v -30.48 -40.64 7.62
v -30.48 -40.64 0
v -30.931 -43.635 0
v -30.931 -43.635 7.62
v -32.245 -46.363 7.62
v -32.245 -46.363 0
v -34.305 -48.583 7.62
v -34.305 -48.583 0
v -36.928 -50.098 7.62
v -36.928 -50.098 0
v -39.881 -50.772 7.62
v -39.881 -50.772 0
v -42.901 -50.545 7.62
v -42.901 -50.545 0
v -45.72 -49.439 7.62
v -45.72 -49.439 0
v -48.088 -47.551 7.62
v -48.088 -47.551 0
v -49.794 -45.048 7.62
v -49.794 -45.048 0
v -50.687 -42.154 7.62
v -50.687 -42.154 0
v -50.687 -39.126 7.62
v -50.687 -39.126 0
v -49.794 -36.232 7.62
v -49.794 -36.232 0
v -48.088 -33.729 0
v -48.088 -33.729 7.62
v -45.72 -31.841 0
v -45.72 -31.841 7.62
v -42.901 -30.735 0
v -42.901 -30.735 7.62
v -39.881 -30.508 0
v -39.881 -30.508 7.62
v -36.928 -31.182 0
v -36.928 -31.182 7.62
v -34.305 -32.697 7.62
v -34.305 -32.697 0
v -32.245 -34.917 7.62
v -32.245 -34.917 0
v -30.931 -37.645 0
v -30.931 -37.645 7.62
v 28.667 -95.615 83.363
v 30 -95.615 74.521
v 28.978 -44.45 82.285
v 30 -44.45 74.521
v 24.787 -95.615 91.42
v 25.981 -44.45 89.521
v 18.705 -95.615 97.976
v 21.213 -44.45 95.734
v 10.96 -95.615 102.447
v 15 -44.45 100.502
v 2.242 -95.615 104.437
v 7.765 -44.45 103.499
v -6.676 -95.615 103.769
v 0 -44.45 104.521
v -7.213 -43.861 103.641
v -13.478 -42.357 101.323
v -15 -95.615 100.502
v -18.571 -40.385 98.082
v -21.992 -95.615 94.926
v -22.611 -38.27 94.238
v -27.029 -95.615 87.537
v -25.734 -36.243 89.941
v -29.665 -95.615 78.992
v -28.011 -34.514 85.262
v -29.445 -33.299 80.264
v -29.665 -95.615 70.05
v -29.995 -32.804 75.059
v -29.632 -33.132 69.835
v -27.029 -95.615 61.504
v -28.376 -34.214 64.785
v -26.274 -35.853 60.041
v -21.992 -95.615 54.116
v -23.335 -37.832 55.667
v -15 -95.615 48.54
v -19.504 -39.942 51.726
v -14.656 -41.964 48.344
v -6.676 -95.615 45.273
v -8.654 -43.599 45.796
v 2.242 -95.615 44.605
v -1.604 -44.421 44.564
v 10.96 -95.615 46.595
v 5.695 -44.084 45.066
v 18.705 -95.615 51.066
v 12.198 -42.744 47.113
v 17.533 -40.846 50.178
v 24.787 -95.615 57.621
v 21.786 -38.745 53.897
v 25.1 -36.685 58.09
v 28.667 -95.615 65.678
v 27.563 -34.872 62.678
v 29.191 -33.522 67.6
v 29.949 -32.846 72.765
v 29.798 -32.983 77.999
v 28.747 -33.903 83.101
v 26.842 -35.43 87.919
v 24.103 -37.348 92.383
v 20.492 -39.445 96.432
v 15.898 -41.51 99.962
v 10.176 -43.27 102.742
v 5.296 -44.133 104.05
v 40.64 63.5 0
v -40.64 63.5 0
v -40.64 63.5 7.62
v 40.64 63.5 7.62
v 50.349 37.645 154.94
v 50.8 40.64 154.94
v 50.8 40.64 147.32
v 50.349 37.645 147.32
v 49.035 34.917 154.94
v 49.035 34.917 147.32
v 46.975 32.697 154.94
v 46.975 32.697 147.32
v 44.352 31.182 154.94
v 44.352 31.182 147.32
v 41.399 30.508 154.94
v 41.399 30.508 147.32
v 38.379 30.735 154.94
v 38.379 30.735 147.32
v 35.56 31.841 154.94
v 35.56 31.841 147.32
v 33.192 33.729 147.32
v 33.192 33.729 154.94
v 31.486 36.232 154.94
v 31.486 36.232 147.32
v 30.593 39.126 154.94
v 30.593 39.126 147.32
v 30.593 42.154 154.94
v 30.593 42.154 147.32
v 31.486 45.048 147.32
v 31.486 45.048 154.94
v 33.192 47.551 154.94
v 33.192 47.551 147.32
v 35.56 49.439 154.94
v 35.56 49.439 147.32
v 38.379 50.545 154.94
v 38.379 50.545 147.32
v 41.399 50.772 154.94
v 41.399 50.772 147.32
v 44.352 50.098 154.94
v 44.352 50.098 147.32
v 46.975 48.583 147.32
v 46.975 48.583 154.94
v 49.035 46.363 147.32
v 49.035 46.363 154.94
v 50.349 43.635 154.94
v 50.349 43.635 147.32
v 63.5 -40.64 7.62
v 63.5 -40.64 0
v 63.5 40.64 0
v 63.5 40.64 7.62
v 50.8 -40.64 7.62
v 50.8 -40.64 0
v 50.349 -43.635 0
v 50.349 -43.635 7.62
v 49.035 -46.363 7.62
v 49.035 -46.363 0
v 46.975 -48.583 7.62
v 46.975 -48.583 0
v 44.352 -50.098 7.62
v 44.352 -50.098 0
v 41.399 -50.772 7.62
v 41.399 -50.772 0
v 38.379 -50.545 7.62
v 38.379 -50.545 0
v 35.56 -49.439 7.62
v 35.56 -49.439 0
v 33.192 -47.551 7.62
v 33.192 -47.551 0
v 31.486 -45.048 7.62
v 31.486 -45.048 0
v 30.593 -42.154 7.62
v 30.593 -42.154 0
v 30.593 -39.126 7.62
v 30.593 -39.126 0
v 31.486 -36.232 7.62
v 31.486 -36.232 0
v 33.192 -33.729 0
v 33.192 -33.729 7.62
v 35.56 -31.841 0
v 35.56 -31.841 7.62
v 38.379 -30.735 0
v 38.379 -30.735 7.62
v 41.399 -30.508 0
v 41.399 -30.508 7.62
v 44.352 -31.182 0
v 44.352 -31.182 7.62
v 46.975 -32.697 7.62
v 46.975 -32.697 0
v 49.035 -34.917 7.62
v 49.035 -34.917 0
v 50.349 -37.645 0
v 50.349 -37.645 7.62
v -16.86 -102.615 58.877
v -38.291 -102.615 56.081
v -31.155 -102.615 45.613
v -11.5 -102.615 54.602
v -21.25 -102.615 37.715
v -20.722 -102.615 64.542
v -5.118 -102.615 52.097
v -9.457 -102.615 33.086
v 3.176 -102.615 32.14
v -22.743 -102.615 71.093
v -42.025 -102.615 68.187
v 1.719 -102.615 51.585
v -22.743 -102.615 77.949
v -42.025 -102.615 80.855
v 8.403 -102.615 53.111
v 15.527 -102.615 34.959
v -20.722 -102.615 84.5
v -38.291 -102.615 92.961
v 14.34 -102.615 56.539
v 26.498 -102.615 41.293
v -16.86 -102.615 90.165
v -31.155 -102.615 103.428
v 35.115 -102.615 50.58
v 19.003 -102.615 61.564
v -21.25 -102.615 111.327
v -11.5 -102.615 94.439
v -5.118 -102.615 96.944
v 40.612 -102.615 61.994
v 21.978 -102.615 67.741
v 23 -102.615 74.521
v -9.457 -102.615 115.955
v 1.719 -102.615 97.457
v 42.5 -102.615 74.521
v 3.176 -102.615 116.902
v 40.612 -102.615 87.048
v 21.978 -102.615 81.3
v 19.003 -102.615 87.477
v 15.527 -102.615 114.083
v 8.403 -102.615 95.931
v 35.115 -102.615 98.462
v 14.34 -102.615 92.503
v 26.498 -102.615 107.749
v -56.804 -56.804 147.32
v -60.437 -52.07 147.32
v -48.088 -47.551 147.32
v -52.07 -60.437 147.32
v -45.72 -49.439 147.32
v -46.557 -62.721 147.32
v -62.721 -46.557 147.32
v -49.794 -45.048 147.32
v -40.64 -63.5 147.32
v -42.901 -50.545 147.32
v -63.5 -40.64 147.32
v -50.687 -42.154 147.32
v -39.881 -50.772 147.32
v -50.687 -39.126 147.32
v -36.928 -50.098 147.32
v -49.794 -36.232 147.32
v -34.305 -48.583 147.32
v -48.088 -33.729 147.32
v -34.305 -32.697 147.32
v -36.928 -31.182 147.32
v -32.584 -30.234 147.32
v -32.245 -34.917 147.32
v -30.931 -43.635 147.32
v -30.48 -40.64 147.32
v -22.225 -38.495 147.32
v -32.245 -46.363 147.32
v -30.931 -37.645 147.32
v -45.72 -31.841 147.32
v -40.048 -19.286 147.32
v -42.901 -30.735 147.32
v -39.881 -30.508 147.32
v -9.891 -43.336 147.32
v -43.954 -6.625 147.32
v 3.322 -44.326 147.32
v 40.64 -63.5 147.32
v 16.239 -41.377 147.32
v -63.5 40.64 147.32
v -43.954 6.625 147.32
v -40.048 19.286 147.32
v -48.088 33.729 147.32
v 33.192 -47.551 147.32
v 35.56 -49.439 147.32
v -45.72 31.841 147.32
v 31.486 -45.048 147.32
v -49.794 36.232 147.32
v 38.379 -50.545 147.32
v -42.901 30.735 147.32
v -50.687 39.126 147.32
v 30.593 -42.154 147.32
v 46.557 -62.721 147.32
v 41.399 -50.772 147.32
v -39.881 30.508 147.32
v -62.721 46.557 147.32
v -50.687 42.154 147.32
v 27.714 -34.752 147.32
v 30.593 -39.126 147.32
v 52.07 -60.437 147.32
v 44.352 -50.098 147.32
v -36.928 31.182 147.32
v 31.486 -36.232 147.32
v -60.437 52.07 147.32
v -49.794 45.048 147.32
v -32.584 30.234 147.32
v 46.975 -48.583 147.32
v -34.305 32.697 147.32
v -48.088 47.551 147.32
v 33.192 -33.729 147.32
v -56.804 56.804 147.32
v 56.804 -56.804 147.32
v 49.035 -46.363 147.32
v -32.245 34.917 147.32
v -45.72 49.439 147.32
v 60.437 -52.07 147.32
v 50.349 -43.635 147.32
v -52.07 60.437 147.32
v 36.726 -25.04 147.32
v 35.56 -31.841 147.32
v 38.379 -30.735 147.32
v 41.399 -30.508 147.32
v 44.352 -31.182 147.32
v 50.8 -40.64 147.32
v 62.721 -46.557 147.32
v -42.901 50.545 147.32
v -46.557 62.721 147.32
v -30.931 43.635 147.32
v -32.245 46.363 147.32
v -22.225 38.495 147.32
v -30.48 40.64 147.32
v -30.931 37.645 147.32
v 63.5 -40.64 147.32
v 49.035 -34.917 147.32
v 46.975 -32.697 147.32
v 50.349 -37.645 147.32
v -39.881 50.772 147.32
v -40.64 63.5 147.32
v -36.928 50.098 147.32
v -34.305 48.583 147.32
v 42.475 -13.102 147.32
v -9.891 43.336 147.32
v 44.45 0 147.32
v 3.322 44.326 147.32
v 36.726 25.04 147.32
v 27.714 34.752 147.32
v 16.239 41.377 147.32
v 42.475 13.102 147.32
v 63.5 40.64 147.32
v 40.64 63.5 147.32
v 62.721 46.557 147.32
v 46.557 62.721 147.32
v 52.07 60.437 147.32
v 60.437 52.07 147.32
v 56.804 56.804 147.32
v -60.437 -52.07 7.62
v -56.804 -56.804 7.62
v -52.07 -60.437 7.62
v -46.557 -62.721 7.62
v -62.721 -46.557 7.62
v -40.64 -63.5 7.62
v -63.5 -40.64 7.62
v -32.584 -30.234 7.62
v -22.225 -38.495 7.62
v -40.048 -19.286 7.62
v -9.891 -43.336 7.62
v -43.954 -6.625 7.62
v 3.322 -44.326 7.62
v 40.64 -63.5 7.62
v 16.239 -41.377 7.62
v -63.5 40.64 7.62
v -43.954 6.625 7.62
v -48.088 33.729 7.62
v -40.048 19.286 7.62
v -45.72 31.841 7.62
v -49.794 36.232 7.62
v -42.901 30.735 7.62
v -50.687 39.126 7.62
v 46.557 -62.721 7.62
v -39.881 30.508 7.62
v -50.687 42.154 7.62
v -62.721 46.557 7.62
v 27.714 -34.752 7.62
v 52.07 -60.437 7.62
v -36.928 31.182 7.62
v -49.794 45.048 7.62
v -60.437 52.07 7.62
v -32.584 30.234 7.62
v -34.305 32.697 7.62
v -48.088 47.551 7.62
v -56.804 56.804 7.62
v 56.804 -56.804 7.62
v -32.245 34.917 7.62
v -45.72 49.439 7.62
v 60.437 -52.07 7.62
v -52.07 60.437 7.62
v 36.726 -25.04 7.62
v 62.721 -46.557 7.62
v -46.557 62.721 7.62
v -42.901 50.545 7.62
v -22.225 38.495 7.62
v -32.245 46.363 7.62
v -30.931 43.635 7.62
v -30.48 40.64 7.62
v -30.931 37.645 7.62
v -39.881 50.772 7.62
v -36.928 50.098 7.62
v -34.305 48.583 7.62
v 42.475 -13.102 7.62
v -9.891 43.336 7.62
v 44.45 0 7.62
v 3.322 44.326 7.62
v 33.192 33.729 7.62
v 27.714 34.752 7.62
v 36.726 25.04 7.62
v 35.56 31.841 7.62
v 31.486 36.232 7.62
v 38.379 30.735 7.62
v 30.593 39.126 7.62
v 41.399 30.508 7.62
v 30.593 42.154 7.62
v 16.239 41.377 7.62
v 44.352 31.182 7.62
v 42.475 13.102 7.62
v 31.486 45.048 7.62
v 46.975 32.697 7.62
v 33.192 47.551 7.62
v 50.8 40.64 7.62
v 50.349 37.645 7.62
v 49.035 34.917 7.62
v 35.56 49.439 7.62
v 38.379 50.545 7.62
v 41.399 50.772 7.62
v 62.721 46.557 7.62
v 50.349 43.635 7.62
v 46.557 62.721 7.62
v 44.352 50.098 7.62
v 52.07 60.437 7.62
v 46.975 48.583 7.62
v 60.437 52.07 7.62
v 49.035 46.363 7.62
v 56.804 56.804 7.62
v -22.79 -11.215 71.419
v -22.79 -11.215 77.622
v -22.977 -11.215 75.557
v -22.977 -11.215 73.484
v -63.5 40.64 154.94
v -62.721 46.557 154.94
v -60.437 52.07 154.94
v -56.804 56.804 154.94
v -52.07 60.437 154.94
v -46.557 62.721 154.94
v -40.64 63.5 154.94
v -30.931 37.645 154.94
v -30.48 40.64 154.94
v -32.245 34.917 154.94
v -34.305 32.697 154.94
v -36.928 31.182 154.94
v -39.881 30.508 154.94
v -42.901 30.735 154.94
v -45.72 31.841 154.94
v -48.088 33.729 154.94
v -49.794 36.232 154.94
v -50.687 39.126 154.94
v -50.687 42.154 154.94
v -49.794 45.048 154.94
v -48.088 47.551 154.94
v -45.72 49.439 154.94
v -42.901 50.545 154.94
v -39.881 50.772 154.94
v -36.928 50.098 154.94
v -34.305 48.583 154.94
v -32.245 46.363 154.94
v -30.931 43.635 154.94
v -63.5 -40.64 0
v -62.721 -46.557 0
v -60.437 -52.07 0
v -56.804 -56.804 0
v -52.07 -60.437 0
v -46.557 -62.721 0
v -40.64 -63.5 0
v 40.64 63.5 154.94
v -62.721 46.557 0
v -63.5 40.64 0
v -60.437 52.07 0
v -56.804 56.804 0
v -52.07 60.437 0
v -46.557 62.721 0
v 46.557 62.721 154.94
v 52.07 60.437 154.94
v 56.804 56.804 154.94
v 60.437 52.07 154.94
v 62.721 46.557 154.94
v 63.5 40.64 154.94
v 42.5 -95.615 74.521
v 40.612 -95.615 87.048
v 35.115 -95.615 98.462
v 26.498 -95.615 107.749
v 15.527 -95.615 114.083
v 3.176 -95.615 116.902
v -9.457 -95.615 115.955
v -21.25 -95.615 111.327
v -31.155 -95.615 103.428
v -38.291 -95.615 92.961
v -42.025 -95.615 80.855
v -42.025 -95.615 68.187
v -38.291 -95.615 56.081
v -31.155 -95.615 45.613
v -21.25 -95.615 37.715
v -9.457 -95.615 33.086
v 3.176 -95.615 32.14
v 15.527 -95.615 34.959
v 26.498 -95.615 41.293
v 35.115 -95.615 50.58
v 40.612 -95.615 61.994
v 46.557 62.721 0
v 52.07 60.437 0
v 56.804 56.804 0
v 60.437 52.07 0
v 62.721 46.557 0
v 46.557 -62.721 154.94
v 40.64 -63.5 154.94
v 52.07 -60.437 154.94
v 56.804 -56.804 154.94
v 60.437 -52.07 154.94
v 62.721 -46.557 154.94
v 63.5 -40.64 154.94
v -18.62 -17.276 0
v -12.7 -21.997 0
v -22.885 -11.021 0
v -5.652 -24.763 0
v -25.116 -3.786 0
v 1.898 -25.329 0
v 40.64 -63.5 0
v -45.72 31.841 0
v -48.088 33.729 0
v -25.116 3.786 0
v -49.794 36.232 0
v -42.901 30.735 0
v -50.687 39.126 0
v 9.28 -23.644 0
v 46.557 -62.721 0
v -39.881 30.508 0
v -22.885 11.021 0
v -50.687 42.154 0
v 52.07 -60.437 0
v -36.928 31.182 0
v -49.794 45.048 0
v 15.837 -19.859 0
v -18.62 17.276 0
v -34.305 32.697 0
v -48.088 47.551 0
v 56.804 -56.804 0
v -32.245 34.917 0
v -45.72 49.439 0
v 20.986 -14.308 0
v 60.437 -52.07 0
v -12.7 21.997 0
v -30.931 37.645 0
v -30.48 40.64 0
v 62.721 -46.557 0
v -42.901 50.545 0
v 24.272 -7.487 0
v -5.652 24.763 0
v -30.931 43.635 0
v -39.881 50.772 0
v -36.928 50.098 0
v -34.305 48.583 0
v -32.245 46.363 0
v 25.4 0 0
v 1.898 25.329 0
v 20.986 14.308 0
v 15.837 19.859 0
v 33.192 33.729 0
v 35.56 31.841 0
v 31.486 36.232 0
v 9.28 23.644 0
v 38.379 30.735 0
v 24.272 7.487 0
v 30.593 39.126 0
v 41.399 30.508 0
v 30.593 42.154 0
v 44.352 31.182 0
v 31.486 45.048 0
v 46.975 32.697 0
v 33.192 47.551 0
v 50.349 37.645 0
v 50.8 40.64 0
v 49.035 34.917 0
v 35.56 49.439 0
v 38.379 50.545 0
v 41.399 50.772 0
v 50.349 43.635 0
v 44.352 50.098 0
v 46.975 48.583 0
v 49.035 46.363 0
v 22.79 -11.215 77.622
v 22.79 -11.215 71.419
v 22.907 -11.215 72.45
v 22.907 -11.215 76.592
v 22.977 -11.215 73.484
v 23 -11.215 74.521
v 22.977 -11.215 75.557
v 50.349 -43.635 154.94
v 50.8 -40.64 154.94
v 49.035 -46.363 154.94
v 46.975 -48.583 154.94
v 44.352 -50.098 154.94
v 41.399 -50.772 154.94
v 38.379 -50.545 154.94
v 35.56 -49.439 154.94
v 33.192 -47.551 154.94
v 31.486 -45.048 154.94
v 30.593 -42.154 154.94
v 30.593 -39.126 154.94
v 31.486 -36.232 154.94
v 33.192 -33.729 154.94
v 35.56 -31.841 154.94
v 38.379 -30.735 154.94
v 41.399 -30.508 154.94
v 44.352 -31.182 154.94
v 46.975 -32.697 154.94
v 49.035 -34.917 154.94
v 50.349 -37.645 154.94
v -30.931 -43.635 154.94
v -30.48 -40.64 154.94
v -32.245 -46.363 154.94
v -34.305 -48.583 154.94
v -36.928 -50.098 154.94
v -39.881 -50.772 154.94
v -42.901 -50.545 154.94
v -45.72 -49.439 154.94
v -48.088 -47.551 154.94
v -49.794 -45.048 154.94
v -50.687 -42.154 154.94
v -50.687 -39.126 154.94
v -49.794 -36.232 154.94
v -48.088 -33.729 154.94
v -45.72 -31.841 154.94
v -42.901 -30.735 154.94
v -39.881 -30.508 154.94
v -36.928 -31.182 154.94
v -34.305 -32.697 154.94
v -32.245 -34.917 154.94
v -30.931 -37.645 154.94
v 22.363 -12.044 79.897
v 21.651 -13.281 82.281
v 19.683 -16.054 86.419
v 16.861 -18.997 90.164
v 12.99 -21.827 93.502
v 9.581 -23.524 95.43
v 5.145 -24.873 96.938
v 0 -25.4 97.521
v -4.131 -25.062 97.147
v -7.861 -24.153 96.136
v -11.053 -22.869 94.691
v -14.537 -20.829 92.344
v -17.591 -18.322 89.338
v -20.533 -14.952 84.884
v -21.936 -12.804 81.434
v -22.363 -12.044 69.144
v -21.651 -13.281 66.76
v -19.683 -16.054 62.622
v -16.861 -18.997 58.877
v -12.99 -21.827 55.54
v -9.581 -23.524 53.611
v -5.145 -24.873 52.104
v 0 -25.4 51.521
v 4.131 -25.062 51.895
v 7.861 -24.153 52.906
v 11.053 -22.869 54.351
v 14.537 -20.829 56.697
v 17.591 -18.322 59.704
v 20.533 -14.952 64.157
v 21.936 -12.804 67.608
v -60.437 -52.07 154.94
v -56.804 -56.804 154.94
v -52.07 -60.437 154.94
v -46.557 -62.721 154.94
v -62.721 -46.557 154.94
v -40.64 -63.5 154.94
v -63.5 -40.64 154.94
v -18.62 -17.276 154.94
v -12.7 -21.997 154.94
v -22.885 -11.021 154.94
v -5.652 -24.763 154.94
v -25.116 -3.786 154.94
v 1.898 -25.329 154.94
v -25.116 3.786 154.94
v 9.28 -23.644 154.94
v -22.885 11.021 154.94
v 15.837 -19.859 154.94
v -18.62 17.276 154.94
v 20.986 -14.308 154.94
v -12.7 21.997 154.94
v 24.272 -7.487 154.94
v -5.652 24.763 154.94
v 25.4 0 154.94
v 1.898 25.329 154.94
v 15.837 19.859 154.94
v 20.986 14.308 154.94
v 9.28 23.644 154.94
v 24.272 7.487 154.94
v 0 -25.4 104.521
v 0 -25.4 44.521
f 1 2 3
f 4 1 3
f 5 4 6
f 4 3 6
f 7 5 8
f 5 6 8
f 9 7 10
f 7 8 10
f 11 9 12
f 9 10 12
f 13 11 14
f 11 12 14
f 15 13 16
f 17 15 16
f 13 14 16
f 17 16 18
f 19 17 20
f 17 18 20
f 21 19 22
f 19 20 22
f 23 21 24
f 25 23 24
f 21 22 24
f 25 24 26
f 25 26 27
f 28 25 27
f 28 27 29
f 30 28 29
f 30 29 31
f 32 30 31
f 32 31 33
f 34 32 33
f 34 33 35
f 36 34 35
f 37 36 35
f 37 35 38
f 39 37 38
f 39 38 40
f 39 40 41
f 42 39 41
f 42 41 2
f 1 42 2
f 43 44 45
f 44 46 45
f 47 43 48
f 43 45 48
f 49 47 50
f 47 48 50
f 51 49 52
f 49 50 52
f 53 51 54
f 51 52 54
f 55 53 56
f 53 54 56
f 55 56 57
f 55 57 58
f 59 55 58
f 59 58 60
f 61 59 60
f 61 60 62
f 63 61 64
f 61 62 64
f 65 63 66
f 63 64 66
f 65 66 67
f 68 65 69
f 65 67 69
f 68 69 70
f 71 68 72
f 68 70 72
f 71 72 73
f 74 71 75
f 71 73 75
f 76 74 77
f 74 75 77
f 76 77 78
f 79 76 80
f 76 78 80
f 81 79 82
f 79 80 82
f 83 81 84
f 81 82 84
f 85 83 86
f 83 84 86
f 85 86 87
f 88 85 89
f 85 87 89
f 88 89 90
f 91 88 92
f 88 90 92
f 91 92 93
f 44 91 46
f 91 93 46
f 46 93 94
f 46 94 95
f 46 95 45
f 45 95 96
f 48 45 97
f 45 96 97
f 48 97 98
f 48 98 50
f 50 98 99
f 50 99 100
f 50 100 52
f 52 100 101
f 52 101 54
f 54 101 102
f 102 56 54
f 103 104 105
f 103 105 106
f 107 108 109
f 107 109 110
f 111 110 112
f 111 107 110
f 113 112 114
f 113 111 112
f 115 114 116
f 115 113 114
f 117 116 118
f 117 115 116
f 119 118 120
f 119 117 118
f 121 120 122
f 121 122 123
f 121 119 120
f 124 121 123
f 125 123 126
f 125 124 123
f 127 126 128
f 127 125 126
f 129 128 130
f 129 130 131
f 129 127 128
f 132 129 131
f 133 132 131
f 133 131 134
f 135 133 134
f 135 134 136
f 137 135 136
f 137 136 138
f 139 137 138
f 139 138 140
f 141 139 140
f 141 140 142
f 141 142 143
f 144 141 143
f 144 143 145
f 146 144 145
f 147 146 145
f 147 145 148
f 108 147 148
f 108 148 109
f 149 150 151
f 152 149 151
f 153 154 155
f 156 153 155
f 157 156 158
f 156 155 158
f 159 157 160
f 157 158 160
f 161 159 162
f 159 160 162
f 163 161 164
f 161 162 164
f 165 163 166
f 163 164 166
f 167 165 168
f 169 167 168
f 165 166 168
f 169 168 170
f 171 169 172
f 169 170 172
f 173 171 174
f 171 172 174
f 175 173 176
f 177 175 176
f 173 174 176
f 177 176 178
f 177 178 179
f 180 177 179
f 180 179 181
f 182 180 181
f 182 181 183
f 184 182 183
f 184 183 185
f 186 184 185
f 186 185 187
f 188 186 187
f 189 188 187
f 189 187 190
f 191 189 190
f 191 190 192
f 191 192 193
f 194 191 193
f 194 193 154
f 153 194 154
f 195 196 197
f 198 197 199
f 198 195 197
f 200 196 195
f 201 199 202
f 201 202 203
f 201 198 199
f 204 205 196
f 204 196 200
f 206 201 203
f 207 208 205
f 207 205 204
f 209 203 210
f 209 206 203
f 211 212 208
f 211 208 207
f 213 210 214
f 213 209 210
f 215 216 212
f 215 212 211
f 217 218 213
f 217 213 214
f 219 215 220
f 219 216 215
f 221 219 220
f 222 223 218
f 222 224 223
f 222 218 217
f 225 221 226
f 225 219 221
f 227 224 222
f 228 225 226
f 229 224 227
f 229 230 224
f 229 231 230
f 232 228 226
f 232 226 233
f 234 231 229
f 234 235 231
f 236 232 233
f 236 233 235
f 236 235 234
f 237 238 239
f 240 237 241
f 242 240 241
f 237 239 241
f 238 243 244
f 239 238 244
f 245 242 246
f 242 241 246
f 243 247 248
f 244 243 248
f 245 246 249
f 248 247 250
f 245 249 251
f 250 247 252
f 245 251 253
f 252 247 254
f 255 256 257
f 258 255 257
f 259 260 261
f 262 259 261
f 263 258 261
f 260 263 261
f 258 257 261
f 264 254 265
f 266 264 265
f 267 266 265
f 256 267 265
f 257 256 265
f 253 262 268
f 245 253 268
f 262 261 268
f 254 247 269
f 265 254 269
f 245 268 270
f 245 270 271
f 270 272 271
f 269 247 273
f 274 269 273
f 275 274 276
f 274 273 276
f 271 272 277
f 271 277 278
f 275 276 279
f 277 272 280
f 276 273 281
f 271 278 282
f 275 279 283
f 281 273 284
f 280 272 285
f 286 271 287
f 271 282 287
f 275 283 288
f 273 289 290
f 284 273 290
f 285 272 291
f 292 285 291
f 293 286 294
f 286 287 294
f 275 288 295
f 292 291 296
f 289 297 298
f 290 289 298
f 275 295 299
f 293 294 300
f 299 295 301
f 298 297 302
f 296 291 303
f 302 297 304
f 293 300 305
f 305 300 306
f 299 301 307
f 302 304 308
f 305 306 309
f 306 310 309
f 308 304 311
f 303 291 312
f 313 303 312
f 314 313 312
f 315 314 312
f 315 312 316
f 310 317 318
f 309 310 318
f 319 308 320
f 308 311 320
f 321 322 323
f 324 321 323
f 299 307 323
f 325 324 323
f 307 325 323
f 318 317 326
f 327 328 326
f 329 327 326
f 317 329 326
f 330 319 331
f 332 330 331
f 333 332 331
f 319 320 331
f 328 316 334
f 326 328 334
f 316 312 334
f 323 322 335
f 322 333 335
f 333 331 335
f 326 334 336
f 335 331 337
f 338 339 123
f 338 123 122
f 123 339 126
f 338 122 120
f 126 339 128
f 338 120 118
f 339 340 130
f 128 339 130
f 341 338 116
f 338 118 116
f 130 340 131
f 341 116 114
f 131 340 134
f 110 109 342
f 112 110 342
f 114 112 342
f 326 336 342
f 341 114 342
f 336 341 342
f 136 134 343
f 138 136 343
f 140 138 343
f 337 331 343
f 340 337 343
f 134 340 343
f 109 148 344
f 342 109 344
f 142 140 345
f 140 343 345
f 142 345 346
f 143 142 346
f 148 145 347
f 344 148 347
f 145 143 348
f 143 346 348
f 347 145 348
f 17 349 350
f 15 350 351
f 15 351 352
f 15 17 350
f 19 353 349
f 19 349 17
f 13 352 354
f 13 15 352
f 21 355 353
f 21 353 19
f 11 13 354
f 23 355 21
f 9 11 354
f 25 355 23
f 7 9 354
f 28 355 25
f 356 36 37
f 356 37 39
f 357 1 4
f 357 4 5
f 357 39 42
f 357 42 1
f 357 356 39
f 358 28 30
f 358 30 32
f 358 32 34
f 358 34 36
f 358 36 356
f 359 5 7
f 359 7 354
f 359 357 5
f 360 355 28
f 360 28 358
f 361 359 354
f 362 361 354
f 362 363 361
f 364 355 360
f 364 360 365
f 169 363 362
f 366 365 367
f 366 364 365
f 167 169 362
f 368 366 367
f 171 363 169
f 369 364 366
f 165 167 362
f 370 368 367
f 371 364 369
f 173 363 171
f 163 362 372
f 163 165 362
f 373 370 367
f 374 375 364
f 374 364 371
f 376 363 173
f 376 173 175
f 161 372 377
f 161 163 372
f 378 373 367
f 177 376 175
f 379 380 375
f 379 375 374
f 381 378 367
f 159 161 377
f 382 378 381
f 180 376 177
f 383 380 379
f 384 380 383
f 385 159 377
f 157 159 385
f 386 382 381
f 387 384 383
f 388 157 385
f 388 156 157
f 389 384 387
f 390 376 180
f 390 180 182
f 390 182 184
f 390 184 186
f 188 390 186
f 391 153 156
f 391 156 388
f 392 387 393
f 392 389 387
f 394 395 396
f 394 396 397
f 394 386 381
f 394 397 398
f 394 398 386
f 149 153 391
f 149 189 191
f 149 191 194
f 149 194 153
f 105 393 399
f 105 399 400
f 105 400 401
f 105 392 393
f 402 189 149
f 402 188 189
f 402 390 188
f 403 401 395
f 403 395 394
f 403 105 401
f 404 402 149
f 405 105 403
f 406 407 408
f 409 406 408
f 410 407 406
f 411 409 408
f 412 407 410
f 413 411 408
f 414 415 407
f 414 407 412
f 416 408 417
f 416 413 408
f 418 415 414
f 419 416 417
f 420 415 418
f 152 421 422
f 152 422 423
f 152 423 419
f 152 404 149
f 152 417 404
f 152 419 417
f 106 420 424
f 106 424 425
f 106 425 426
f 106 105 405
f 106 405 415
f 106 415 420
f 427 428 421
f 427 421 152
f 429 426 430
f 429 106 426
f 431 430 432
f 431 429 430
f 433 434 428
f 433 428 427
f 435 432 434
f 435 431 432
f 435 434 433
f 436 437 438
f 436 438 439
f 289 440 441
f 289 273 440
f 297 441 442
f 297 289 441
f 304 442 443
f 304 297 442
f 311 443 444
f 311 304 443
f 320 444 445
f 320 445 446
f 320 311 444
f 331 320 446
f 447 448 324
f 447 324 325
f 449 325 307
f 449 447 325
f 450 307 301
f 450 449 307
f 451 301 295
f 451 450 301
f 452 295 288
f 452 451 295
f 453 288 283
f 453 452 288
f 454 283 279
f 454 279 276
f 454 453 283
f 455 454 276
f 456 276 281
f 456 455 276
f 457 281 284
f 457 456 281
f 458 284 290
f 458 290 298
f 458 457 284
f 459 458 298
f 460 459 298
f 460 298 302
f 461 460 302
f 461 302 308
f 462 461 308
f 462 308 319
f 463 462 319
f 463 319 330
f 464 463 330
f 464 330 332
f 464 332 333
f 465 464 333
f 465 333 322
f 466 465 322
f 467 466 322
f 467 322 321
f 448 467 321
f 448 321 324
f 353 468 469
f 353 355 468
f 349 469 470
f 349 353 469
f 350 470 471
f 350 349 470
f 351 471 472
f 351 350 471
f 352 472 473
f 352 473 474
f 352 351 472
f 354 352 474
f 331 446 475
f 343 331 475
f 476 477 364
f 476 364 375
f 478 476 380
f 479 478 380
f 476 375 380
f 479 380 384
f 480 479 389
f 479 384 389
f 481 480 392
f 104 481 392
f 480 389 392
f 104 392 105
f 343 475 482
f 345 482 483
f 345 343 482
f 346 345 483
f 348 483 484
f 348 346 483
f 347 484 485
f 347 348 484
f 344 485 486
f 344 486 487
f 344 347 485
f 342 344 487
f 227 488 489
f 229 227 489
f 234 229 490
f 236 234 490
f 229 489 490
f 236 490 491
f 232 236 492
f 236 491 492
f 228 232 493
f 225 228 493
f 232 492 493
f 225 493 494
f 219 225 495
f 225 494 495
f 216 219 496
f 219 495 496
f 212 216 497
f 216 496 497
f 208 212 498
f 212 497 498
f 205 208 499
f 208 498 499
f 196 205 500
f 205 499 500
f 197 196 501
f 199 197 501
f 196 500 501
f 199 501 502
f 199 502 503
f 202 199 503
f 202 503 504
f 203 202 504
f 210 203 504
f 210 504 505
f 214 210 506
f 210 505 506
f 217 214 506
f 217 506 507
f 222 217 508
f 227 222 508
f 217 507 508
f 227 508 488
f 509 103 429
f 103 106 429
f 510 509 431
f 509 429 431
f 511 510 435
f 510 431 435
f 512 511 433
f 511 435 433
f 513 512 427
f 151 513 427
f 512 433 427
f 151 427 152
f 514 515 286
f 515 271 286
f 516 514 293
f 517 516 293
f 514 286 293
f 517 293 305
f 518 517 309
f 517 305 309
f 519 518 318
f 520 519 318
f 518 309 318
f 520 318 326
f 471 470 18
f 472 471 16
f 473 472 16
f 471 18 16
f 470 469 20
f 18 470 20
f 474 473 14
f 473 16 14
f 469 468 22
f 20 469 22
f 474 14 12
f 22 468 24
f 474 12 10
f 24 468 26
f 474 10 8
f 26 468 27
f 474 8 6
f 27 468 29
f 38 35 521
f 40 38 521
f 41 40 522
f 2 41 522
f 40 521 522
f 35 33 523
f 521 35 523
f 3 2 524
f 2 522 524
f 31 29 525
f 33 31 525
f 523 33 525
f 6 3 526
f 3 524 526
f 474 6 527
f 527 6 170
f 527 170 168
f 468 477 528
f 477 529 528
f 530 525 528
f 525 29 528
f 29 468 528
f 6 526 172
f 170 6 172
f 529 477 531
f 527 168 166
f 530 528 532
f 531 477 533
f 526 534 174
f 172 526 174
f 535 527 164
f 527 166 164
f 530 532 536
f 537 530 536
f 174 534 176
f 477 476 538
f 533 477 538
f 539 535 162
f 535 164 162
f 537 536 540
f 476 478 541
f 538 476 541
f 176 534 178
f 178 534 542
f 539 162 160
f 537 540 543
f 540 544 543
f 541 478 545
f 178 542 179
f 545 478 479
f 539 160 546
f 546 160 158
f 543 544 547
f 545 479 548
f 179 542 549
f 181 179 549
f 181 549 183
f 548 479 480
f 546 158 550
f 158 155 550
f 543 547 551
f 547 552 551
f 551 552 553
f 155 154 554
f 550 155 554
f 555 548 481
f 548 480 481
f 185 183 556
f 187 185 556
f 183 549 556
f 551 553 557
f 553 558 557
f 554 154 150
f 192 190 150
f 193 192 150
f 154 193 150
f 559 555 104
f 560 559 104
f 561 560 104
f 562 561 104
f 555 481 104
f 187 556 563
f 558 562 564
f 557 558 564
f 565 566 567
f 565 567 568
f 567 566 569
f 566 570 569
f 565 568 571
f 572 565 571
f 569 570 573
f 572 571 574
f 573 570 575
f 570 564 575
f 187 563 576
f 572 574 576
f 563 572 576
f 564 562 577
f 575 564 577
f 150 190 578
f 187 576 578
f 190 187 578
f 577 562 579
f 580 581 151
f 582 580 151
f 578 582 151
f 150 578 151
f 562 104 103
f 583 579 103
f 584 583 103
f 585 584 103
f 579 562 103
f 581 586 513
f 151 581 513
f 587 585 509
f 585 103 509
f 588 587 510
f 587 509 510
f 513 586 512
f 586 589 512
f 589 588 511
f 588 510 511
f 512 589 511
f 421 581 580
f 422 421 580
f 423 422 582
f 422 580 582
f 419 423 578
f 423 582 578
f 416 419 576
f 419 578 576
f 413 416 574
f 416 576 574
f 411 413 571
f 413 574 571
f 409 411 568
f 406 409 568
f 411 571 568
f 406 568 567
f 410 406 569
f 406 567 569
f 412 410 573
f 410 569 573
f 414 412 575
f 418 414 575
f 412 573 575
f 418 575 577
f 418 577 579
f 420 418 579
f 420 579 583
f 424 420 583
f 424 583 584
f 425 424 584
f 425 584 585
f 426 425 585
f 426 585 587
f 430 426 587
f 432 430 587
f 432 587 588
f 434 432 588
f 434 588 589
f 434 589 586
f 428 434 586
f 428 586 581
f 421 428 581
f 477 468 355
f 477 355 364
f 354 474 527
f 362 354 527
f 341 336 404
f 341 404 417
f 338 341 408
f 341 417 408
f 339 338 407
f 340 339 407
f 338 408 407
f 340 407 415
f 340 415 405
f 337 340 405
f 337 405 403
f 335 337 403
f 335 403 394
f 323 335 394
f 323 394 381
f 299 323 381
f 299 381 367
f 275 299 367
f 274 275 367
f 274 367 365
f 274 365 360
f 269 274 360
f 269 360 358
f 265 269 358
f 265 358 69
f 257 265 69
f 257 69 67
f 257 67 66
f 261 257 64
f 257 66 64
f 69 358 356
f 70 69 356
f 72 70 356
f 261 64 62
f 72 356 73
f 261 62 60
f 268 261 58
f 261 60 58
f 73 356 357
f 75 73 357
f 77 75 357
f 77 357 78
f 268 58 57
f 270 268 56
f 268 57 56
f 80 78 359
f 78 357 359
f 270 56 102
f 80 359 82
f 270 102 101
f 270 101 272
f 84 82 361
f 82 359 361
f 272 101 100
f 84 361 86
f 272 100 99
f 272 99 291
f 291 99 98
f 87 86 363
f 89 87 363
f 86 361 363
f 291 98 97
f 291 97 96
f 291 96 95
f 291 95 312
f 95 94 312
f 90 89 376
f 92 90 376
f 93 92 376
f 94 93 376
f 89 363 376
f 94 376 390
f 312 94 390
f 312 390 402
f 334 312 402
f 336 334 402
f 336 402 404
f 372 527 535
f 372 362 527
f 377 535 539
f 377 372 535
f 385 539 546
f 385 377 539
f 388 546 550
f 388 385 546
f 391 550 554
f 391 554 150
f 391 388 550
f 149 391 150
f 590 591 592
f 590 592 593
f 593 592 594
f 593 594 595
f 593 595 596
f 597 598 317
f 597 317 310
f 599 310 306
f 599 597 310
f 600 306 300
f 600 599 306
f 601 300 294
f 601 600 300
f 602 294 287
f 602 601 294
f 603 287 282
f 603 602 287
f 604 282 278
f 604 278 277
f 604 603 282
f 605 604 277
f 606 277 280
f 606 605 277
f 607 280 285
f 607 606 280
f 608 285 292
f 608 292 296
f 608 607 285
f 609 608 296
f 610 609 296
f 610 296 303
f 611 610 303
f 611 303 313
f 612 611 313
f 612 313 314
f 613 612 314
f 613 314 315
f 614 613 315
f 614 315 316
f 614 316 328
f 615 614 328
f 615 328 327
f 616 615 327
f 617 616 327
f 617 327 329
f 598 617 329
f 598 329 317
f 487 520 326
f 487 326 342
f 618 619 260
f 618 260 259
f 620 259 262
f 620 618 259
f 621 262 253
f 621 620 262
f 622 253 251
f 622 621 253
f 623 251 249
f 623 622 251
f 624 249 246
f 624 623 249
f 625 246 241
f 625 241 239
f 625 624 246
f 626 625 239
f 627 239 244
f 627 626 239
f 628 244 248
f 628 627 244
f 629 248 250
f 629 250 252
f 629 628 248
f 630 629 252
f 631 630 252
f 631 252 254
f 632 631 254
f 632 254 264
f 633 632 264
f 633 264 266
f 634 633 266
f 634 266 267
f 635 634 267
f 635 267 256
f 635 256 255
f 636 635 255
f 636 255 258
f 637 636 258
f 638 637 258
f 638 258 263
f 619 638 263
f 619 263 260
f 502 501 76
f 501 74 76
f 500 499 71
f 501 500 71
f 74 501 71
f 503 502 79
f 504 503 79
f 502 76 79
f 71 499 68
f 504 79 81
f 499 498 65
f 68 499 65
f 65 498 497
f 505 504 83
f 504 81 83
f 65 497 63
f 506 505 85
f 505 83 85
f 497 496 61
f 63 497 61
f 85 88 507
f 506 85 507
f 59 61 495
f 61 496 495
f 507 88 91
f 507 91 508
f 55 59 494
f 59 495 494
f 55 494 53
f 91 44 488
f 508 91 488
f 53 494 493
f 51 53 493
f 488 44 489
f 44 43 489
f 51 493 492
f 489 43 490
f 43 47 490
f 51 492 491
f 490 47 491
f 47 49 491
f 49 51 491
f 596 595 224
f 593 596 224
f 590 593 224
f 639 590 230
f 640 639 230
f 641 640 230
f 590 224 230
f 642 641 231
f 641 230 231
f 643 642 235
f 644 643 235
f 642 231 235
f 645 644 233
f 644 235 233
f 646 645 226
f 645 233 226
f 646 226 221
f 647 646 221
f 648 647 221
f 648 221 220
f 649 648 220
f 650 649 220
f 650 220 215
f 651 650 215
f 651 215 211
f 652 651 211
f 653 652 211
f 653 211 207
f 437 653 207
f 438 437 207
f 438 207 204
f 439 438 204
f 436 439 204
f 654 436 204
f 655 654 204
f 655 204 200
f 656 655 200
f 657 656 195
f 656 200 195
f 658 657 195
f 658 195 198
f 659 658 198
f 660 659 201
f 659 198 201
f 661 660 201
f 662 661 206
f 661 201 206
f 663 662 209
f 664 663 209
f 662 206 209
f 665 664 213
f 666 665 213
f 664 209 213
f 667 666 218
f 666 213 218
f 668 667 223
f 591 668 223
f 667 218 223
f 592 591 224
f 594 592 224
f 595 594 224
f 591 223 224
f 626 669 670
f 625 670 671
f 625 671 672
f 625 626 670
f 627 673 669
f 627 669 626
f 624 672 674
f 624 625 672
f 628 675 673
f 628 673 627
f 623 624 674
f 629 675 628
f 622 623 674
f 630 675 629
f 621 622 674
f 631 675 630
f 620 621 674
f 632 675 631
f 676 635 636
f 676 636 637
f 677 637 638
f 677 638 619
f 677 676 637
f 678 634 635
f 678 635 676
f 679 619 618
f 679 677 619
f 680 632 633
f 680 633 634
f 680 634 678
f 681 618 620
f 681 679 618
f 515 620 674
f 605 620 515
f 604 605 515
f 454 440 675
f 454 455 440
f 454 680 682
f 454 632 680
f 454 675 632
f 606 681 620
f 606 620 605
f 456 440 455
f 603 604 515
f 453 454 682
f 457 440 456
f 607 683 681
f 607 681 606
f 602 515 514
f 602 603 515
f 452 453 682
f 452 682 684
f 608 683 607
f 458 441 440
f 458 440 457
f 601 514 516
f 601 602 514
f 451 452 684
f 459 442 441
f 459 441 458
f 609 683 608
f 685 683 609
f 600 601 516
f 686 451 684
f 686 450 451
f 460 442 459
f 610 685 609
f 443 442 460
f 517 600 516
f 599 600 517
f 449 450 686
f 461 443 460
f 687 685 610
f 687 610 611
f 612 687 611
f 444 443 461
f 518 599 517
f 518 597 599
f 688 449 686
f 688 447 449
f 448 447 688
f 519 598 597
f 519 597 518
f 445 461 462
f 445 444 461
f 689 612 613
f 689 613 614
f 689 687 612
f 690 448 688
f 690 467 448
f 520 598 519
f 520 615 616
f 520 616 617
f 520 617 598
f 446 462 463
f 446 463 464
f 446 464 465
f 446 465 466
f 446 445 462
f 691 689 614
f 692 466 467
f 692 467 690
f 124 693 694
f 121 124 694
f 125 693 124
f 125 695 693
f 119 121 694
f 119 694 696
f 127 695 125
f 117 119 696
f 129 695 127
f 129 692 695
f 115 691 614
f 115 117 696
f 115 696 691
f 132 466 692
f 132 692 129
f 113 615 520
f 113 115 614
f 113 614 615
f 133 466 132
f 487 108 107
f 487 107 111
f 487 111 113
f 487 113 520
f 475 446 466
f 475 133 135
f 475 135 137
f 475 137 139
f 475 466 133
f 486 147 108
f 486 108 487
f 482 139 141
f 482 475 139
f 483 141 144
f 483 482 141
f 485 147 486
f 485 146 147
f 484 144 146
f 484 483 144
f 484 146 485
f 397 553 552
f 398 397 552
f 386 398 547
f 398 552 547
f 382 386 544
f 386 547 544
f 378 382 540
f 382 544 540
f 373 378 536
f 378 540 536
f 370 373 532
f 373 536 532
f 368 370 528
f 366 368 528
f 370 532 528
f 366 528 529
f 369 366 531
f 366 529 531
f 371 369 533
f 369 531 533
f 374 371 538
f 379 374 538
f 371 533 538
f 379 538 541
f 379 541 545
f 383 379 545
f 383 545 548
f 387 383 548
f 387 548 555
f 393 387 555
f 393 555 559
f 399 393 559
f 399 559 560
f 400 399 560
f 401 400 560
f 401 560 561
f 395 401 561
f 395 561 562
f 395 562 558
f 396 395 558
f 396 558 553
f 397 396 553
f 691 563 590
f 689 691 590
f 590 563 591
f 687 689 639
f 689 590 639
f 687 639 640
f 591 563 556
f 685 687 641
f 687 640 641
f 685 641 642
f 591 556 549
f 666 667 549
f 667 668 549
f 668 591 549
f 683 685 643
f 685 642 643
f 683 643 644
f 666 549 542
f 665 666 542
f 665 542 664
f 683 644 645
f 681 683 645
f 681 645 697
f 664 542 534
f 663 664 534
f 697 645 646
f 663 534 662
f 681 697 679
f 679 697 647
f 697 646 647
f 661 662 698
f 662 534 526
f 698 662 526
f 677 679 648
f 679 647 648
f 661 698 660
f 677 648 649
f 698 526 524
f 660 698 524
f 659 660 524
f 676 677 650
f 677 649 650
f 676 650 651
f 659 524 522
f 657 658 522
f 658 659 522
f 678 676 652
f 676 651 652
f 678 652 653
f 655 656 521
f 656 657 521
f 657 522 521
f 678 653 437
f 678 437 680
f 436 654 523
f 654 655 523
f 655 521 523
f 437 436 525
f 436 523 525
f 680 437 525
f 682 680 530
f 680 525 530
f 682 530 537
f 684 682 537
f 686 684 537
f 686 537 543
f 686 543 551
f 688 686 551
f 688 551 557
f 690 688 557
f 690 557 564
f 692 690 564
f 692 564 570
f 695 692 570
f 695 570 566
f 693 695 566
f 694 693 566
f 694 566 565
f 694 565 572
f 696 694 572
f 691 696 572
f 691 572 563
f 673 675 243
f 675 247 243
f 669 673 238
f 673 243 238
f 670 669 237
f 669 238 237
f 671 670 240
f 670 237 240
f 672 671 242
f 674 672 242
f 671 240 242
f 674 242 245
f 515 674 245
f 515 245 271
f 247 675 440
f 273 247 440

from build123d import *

# Parameters (mm, degrees)
F0_W           = 127
F0_H           = 127
F1_DEPTH       = 7.62
F2_R           = 44.45
F3_DEPTH       = 139.7
F4_R           = 22.86
F6_R           = 10.16
F7_DEPTH       = 25.4
F9_R           = 25.4
F10_DEPTH      = 154.941
F12_R          = 30
F13_DEPTH      = 19.05
F13_DEPTH_BACK = 51.16455
F14_R          = 42.5
F14_R_2        = 30
F15_DEPTH      = 7
F16_R          = 23
F17_DEPTH      = 91.3994


with BuildPart() as f1:
    # F0 (on Top) → F1 (new body)
    with BuildSketch(Plane.XY):
        Rectangle(F0_W, F0_H)
    extrude(amount=F1_DEPTH)

    # F2 (on face) → F3 (join)
    with BuildSketch(Plane.XY.offset(7.62)):
        Circle(F2_R)
    extrude(amount=F3_DEPTH)

    # F4
    f4_edges = [f1.edges().sort_by_distance(p)[0] for p in [
        (63.5, -63.5, 3.81),
        (63.5, 63.5, 3.81),
        (-63.5, -63.5, 3.81),
        (-63.5, 63.5, 3.81),
    ]]
    fillet(f4_edges, radius=F4_R)

    # F6 (on face) → F7 (cut)
    with BuildSketch(Plane(origin=(0, 0, 0), x_dir=(1, 0, 0), z_dir=(0, 0, -1))):
        with Locations((40.64, -40.64)):
            Circle(F6_R)
        with Locations((-40.64, -40.64)):
            Circle(F6_R)
        with Locations((40.64, 40.64)):
            Circle(F6_R)
        with Locations((-40.64, 40.64)):
            Circle(F6_R)
    extrude(amount=-F7_DEPTH, mode=Mode.SUBTRACT)

    # F8: F1 across plane


with BuildPart() as f1_1:
    add(f1.part)
    add(f1.part.mirror(Plane.XY.offset(77.47)))

    # F9 (on face) → F10 (cut, through all)
    with BuildSketch(Plane(origin=(0, 0, 0), x_dir=(1, 0, 0), z_dir=(0, 0, -1))):
        Circle(F9_R)
    extrude(amount=-F10_DEPTH, mode=Mode.SUBTRACT)

    # F12 (on offset) → F13 (join, two sides)
    with BuildSketch(Plane.XZ.offset(44.45)) as f13_sk:
        with Locations((0, 74.5208350375)):
            Circle(F12_R)
    extrude(amount=-F13_DEPTH)
    extrude(f13_sk.sketch, amount=F13_DEPTH_BACK)

    # F14 (on face) → F15 (join)
    with BuildSketch(Plane.XZ.offset(95.61455)):
        with Locations((0, 74.5208350375)):
            Circle(F14_R)
        with Locations((0, 74.5208350375)):
            Circle(F14_R_2, mode=Mode.SUBTRACT)
        with Locations((0, 74.5208350375)):
            Circle(F14_R_2)
    extrude(amount=F15_DEPTH)

    # F16 (on face) → F17 (cut)
    with BuildSketch(Plane.XZ.offset(102.61455)):
        with Locations((0, 74.5208350375)):
            Circle(F16_R)
    extrude(amount=-F17_DEPTH, mode=Mode.SUBTRACT)


solid = f1_1.part
